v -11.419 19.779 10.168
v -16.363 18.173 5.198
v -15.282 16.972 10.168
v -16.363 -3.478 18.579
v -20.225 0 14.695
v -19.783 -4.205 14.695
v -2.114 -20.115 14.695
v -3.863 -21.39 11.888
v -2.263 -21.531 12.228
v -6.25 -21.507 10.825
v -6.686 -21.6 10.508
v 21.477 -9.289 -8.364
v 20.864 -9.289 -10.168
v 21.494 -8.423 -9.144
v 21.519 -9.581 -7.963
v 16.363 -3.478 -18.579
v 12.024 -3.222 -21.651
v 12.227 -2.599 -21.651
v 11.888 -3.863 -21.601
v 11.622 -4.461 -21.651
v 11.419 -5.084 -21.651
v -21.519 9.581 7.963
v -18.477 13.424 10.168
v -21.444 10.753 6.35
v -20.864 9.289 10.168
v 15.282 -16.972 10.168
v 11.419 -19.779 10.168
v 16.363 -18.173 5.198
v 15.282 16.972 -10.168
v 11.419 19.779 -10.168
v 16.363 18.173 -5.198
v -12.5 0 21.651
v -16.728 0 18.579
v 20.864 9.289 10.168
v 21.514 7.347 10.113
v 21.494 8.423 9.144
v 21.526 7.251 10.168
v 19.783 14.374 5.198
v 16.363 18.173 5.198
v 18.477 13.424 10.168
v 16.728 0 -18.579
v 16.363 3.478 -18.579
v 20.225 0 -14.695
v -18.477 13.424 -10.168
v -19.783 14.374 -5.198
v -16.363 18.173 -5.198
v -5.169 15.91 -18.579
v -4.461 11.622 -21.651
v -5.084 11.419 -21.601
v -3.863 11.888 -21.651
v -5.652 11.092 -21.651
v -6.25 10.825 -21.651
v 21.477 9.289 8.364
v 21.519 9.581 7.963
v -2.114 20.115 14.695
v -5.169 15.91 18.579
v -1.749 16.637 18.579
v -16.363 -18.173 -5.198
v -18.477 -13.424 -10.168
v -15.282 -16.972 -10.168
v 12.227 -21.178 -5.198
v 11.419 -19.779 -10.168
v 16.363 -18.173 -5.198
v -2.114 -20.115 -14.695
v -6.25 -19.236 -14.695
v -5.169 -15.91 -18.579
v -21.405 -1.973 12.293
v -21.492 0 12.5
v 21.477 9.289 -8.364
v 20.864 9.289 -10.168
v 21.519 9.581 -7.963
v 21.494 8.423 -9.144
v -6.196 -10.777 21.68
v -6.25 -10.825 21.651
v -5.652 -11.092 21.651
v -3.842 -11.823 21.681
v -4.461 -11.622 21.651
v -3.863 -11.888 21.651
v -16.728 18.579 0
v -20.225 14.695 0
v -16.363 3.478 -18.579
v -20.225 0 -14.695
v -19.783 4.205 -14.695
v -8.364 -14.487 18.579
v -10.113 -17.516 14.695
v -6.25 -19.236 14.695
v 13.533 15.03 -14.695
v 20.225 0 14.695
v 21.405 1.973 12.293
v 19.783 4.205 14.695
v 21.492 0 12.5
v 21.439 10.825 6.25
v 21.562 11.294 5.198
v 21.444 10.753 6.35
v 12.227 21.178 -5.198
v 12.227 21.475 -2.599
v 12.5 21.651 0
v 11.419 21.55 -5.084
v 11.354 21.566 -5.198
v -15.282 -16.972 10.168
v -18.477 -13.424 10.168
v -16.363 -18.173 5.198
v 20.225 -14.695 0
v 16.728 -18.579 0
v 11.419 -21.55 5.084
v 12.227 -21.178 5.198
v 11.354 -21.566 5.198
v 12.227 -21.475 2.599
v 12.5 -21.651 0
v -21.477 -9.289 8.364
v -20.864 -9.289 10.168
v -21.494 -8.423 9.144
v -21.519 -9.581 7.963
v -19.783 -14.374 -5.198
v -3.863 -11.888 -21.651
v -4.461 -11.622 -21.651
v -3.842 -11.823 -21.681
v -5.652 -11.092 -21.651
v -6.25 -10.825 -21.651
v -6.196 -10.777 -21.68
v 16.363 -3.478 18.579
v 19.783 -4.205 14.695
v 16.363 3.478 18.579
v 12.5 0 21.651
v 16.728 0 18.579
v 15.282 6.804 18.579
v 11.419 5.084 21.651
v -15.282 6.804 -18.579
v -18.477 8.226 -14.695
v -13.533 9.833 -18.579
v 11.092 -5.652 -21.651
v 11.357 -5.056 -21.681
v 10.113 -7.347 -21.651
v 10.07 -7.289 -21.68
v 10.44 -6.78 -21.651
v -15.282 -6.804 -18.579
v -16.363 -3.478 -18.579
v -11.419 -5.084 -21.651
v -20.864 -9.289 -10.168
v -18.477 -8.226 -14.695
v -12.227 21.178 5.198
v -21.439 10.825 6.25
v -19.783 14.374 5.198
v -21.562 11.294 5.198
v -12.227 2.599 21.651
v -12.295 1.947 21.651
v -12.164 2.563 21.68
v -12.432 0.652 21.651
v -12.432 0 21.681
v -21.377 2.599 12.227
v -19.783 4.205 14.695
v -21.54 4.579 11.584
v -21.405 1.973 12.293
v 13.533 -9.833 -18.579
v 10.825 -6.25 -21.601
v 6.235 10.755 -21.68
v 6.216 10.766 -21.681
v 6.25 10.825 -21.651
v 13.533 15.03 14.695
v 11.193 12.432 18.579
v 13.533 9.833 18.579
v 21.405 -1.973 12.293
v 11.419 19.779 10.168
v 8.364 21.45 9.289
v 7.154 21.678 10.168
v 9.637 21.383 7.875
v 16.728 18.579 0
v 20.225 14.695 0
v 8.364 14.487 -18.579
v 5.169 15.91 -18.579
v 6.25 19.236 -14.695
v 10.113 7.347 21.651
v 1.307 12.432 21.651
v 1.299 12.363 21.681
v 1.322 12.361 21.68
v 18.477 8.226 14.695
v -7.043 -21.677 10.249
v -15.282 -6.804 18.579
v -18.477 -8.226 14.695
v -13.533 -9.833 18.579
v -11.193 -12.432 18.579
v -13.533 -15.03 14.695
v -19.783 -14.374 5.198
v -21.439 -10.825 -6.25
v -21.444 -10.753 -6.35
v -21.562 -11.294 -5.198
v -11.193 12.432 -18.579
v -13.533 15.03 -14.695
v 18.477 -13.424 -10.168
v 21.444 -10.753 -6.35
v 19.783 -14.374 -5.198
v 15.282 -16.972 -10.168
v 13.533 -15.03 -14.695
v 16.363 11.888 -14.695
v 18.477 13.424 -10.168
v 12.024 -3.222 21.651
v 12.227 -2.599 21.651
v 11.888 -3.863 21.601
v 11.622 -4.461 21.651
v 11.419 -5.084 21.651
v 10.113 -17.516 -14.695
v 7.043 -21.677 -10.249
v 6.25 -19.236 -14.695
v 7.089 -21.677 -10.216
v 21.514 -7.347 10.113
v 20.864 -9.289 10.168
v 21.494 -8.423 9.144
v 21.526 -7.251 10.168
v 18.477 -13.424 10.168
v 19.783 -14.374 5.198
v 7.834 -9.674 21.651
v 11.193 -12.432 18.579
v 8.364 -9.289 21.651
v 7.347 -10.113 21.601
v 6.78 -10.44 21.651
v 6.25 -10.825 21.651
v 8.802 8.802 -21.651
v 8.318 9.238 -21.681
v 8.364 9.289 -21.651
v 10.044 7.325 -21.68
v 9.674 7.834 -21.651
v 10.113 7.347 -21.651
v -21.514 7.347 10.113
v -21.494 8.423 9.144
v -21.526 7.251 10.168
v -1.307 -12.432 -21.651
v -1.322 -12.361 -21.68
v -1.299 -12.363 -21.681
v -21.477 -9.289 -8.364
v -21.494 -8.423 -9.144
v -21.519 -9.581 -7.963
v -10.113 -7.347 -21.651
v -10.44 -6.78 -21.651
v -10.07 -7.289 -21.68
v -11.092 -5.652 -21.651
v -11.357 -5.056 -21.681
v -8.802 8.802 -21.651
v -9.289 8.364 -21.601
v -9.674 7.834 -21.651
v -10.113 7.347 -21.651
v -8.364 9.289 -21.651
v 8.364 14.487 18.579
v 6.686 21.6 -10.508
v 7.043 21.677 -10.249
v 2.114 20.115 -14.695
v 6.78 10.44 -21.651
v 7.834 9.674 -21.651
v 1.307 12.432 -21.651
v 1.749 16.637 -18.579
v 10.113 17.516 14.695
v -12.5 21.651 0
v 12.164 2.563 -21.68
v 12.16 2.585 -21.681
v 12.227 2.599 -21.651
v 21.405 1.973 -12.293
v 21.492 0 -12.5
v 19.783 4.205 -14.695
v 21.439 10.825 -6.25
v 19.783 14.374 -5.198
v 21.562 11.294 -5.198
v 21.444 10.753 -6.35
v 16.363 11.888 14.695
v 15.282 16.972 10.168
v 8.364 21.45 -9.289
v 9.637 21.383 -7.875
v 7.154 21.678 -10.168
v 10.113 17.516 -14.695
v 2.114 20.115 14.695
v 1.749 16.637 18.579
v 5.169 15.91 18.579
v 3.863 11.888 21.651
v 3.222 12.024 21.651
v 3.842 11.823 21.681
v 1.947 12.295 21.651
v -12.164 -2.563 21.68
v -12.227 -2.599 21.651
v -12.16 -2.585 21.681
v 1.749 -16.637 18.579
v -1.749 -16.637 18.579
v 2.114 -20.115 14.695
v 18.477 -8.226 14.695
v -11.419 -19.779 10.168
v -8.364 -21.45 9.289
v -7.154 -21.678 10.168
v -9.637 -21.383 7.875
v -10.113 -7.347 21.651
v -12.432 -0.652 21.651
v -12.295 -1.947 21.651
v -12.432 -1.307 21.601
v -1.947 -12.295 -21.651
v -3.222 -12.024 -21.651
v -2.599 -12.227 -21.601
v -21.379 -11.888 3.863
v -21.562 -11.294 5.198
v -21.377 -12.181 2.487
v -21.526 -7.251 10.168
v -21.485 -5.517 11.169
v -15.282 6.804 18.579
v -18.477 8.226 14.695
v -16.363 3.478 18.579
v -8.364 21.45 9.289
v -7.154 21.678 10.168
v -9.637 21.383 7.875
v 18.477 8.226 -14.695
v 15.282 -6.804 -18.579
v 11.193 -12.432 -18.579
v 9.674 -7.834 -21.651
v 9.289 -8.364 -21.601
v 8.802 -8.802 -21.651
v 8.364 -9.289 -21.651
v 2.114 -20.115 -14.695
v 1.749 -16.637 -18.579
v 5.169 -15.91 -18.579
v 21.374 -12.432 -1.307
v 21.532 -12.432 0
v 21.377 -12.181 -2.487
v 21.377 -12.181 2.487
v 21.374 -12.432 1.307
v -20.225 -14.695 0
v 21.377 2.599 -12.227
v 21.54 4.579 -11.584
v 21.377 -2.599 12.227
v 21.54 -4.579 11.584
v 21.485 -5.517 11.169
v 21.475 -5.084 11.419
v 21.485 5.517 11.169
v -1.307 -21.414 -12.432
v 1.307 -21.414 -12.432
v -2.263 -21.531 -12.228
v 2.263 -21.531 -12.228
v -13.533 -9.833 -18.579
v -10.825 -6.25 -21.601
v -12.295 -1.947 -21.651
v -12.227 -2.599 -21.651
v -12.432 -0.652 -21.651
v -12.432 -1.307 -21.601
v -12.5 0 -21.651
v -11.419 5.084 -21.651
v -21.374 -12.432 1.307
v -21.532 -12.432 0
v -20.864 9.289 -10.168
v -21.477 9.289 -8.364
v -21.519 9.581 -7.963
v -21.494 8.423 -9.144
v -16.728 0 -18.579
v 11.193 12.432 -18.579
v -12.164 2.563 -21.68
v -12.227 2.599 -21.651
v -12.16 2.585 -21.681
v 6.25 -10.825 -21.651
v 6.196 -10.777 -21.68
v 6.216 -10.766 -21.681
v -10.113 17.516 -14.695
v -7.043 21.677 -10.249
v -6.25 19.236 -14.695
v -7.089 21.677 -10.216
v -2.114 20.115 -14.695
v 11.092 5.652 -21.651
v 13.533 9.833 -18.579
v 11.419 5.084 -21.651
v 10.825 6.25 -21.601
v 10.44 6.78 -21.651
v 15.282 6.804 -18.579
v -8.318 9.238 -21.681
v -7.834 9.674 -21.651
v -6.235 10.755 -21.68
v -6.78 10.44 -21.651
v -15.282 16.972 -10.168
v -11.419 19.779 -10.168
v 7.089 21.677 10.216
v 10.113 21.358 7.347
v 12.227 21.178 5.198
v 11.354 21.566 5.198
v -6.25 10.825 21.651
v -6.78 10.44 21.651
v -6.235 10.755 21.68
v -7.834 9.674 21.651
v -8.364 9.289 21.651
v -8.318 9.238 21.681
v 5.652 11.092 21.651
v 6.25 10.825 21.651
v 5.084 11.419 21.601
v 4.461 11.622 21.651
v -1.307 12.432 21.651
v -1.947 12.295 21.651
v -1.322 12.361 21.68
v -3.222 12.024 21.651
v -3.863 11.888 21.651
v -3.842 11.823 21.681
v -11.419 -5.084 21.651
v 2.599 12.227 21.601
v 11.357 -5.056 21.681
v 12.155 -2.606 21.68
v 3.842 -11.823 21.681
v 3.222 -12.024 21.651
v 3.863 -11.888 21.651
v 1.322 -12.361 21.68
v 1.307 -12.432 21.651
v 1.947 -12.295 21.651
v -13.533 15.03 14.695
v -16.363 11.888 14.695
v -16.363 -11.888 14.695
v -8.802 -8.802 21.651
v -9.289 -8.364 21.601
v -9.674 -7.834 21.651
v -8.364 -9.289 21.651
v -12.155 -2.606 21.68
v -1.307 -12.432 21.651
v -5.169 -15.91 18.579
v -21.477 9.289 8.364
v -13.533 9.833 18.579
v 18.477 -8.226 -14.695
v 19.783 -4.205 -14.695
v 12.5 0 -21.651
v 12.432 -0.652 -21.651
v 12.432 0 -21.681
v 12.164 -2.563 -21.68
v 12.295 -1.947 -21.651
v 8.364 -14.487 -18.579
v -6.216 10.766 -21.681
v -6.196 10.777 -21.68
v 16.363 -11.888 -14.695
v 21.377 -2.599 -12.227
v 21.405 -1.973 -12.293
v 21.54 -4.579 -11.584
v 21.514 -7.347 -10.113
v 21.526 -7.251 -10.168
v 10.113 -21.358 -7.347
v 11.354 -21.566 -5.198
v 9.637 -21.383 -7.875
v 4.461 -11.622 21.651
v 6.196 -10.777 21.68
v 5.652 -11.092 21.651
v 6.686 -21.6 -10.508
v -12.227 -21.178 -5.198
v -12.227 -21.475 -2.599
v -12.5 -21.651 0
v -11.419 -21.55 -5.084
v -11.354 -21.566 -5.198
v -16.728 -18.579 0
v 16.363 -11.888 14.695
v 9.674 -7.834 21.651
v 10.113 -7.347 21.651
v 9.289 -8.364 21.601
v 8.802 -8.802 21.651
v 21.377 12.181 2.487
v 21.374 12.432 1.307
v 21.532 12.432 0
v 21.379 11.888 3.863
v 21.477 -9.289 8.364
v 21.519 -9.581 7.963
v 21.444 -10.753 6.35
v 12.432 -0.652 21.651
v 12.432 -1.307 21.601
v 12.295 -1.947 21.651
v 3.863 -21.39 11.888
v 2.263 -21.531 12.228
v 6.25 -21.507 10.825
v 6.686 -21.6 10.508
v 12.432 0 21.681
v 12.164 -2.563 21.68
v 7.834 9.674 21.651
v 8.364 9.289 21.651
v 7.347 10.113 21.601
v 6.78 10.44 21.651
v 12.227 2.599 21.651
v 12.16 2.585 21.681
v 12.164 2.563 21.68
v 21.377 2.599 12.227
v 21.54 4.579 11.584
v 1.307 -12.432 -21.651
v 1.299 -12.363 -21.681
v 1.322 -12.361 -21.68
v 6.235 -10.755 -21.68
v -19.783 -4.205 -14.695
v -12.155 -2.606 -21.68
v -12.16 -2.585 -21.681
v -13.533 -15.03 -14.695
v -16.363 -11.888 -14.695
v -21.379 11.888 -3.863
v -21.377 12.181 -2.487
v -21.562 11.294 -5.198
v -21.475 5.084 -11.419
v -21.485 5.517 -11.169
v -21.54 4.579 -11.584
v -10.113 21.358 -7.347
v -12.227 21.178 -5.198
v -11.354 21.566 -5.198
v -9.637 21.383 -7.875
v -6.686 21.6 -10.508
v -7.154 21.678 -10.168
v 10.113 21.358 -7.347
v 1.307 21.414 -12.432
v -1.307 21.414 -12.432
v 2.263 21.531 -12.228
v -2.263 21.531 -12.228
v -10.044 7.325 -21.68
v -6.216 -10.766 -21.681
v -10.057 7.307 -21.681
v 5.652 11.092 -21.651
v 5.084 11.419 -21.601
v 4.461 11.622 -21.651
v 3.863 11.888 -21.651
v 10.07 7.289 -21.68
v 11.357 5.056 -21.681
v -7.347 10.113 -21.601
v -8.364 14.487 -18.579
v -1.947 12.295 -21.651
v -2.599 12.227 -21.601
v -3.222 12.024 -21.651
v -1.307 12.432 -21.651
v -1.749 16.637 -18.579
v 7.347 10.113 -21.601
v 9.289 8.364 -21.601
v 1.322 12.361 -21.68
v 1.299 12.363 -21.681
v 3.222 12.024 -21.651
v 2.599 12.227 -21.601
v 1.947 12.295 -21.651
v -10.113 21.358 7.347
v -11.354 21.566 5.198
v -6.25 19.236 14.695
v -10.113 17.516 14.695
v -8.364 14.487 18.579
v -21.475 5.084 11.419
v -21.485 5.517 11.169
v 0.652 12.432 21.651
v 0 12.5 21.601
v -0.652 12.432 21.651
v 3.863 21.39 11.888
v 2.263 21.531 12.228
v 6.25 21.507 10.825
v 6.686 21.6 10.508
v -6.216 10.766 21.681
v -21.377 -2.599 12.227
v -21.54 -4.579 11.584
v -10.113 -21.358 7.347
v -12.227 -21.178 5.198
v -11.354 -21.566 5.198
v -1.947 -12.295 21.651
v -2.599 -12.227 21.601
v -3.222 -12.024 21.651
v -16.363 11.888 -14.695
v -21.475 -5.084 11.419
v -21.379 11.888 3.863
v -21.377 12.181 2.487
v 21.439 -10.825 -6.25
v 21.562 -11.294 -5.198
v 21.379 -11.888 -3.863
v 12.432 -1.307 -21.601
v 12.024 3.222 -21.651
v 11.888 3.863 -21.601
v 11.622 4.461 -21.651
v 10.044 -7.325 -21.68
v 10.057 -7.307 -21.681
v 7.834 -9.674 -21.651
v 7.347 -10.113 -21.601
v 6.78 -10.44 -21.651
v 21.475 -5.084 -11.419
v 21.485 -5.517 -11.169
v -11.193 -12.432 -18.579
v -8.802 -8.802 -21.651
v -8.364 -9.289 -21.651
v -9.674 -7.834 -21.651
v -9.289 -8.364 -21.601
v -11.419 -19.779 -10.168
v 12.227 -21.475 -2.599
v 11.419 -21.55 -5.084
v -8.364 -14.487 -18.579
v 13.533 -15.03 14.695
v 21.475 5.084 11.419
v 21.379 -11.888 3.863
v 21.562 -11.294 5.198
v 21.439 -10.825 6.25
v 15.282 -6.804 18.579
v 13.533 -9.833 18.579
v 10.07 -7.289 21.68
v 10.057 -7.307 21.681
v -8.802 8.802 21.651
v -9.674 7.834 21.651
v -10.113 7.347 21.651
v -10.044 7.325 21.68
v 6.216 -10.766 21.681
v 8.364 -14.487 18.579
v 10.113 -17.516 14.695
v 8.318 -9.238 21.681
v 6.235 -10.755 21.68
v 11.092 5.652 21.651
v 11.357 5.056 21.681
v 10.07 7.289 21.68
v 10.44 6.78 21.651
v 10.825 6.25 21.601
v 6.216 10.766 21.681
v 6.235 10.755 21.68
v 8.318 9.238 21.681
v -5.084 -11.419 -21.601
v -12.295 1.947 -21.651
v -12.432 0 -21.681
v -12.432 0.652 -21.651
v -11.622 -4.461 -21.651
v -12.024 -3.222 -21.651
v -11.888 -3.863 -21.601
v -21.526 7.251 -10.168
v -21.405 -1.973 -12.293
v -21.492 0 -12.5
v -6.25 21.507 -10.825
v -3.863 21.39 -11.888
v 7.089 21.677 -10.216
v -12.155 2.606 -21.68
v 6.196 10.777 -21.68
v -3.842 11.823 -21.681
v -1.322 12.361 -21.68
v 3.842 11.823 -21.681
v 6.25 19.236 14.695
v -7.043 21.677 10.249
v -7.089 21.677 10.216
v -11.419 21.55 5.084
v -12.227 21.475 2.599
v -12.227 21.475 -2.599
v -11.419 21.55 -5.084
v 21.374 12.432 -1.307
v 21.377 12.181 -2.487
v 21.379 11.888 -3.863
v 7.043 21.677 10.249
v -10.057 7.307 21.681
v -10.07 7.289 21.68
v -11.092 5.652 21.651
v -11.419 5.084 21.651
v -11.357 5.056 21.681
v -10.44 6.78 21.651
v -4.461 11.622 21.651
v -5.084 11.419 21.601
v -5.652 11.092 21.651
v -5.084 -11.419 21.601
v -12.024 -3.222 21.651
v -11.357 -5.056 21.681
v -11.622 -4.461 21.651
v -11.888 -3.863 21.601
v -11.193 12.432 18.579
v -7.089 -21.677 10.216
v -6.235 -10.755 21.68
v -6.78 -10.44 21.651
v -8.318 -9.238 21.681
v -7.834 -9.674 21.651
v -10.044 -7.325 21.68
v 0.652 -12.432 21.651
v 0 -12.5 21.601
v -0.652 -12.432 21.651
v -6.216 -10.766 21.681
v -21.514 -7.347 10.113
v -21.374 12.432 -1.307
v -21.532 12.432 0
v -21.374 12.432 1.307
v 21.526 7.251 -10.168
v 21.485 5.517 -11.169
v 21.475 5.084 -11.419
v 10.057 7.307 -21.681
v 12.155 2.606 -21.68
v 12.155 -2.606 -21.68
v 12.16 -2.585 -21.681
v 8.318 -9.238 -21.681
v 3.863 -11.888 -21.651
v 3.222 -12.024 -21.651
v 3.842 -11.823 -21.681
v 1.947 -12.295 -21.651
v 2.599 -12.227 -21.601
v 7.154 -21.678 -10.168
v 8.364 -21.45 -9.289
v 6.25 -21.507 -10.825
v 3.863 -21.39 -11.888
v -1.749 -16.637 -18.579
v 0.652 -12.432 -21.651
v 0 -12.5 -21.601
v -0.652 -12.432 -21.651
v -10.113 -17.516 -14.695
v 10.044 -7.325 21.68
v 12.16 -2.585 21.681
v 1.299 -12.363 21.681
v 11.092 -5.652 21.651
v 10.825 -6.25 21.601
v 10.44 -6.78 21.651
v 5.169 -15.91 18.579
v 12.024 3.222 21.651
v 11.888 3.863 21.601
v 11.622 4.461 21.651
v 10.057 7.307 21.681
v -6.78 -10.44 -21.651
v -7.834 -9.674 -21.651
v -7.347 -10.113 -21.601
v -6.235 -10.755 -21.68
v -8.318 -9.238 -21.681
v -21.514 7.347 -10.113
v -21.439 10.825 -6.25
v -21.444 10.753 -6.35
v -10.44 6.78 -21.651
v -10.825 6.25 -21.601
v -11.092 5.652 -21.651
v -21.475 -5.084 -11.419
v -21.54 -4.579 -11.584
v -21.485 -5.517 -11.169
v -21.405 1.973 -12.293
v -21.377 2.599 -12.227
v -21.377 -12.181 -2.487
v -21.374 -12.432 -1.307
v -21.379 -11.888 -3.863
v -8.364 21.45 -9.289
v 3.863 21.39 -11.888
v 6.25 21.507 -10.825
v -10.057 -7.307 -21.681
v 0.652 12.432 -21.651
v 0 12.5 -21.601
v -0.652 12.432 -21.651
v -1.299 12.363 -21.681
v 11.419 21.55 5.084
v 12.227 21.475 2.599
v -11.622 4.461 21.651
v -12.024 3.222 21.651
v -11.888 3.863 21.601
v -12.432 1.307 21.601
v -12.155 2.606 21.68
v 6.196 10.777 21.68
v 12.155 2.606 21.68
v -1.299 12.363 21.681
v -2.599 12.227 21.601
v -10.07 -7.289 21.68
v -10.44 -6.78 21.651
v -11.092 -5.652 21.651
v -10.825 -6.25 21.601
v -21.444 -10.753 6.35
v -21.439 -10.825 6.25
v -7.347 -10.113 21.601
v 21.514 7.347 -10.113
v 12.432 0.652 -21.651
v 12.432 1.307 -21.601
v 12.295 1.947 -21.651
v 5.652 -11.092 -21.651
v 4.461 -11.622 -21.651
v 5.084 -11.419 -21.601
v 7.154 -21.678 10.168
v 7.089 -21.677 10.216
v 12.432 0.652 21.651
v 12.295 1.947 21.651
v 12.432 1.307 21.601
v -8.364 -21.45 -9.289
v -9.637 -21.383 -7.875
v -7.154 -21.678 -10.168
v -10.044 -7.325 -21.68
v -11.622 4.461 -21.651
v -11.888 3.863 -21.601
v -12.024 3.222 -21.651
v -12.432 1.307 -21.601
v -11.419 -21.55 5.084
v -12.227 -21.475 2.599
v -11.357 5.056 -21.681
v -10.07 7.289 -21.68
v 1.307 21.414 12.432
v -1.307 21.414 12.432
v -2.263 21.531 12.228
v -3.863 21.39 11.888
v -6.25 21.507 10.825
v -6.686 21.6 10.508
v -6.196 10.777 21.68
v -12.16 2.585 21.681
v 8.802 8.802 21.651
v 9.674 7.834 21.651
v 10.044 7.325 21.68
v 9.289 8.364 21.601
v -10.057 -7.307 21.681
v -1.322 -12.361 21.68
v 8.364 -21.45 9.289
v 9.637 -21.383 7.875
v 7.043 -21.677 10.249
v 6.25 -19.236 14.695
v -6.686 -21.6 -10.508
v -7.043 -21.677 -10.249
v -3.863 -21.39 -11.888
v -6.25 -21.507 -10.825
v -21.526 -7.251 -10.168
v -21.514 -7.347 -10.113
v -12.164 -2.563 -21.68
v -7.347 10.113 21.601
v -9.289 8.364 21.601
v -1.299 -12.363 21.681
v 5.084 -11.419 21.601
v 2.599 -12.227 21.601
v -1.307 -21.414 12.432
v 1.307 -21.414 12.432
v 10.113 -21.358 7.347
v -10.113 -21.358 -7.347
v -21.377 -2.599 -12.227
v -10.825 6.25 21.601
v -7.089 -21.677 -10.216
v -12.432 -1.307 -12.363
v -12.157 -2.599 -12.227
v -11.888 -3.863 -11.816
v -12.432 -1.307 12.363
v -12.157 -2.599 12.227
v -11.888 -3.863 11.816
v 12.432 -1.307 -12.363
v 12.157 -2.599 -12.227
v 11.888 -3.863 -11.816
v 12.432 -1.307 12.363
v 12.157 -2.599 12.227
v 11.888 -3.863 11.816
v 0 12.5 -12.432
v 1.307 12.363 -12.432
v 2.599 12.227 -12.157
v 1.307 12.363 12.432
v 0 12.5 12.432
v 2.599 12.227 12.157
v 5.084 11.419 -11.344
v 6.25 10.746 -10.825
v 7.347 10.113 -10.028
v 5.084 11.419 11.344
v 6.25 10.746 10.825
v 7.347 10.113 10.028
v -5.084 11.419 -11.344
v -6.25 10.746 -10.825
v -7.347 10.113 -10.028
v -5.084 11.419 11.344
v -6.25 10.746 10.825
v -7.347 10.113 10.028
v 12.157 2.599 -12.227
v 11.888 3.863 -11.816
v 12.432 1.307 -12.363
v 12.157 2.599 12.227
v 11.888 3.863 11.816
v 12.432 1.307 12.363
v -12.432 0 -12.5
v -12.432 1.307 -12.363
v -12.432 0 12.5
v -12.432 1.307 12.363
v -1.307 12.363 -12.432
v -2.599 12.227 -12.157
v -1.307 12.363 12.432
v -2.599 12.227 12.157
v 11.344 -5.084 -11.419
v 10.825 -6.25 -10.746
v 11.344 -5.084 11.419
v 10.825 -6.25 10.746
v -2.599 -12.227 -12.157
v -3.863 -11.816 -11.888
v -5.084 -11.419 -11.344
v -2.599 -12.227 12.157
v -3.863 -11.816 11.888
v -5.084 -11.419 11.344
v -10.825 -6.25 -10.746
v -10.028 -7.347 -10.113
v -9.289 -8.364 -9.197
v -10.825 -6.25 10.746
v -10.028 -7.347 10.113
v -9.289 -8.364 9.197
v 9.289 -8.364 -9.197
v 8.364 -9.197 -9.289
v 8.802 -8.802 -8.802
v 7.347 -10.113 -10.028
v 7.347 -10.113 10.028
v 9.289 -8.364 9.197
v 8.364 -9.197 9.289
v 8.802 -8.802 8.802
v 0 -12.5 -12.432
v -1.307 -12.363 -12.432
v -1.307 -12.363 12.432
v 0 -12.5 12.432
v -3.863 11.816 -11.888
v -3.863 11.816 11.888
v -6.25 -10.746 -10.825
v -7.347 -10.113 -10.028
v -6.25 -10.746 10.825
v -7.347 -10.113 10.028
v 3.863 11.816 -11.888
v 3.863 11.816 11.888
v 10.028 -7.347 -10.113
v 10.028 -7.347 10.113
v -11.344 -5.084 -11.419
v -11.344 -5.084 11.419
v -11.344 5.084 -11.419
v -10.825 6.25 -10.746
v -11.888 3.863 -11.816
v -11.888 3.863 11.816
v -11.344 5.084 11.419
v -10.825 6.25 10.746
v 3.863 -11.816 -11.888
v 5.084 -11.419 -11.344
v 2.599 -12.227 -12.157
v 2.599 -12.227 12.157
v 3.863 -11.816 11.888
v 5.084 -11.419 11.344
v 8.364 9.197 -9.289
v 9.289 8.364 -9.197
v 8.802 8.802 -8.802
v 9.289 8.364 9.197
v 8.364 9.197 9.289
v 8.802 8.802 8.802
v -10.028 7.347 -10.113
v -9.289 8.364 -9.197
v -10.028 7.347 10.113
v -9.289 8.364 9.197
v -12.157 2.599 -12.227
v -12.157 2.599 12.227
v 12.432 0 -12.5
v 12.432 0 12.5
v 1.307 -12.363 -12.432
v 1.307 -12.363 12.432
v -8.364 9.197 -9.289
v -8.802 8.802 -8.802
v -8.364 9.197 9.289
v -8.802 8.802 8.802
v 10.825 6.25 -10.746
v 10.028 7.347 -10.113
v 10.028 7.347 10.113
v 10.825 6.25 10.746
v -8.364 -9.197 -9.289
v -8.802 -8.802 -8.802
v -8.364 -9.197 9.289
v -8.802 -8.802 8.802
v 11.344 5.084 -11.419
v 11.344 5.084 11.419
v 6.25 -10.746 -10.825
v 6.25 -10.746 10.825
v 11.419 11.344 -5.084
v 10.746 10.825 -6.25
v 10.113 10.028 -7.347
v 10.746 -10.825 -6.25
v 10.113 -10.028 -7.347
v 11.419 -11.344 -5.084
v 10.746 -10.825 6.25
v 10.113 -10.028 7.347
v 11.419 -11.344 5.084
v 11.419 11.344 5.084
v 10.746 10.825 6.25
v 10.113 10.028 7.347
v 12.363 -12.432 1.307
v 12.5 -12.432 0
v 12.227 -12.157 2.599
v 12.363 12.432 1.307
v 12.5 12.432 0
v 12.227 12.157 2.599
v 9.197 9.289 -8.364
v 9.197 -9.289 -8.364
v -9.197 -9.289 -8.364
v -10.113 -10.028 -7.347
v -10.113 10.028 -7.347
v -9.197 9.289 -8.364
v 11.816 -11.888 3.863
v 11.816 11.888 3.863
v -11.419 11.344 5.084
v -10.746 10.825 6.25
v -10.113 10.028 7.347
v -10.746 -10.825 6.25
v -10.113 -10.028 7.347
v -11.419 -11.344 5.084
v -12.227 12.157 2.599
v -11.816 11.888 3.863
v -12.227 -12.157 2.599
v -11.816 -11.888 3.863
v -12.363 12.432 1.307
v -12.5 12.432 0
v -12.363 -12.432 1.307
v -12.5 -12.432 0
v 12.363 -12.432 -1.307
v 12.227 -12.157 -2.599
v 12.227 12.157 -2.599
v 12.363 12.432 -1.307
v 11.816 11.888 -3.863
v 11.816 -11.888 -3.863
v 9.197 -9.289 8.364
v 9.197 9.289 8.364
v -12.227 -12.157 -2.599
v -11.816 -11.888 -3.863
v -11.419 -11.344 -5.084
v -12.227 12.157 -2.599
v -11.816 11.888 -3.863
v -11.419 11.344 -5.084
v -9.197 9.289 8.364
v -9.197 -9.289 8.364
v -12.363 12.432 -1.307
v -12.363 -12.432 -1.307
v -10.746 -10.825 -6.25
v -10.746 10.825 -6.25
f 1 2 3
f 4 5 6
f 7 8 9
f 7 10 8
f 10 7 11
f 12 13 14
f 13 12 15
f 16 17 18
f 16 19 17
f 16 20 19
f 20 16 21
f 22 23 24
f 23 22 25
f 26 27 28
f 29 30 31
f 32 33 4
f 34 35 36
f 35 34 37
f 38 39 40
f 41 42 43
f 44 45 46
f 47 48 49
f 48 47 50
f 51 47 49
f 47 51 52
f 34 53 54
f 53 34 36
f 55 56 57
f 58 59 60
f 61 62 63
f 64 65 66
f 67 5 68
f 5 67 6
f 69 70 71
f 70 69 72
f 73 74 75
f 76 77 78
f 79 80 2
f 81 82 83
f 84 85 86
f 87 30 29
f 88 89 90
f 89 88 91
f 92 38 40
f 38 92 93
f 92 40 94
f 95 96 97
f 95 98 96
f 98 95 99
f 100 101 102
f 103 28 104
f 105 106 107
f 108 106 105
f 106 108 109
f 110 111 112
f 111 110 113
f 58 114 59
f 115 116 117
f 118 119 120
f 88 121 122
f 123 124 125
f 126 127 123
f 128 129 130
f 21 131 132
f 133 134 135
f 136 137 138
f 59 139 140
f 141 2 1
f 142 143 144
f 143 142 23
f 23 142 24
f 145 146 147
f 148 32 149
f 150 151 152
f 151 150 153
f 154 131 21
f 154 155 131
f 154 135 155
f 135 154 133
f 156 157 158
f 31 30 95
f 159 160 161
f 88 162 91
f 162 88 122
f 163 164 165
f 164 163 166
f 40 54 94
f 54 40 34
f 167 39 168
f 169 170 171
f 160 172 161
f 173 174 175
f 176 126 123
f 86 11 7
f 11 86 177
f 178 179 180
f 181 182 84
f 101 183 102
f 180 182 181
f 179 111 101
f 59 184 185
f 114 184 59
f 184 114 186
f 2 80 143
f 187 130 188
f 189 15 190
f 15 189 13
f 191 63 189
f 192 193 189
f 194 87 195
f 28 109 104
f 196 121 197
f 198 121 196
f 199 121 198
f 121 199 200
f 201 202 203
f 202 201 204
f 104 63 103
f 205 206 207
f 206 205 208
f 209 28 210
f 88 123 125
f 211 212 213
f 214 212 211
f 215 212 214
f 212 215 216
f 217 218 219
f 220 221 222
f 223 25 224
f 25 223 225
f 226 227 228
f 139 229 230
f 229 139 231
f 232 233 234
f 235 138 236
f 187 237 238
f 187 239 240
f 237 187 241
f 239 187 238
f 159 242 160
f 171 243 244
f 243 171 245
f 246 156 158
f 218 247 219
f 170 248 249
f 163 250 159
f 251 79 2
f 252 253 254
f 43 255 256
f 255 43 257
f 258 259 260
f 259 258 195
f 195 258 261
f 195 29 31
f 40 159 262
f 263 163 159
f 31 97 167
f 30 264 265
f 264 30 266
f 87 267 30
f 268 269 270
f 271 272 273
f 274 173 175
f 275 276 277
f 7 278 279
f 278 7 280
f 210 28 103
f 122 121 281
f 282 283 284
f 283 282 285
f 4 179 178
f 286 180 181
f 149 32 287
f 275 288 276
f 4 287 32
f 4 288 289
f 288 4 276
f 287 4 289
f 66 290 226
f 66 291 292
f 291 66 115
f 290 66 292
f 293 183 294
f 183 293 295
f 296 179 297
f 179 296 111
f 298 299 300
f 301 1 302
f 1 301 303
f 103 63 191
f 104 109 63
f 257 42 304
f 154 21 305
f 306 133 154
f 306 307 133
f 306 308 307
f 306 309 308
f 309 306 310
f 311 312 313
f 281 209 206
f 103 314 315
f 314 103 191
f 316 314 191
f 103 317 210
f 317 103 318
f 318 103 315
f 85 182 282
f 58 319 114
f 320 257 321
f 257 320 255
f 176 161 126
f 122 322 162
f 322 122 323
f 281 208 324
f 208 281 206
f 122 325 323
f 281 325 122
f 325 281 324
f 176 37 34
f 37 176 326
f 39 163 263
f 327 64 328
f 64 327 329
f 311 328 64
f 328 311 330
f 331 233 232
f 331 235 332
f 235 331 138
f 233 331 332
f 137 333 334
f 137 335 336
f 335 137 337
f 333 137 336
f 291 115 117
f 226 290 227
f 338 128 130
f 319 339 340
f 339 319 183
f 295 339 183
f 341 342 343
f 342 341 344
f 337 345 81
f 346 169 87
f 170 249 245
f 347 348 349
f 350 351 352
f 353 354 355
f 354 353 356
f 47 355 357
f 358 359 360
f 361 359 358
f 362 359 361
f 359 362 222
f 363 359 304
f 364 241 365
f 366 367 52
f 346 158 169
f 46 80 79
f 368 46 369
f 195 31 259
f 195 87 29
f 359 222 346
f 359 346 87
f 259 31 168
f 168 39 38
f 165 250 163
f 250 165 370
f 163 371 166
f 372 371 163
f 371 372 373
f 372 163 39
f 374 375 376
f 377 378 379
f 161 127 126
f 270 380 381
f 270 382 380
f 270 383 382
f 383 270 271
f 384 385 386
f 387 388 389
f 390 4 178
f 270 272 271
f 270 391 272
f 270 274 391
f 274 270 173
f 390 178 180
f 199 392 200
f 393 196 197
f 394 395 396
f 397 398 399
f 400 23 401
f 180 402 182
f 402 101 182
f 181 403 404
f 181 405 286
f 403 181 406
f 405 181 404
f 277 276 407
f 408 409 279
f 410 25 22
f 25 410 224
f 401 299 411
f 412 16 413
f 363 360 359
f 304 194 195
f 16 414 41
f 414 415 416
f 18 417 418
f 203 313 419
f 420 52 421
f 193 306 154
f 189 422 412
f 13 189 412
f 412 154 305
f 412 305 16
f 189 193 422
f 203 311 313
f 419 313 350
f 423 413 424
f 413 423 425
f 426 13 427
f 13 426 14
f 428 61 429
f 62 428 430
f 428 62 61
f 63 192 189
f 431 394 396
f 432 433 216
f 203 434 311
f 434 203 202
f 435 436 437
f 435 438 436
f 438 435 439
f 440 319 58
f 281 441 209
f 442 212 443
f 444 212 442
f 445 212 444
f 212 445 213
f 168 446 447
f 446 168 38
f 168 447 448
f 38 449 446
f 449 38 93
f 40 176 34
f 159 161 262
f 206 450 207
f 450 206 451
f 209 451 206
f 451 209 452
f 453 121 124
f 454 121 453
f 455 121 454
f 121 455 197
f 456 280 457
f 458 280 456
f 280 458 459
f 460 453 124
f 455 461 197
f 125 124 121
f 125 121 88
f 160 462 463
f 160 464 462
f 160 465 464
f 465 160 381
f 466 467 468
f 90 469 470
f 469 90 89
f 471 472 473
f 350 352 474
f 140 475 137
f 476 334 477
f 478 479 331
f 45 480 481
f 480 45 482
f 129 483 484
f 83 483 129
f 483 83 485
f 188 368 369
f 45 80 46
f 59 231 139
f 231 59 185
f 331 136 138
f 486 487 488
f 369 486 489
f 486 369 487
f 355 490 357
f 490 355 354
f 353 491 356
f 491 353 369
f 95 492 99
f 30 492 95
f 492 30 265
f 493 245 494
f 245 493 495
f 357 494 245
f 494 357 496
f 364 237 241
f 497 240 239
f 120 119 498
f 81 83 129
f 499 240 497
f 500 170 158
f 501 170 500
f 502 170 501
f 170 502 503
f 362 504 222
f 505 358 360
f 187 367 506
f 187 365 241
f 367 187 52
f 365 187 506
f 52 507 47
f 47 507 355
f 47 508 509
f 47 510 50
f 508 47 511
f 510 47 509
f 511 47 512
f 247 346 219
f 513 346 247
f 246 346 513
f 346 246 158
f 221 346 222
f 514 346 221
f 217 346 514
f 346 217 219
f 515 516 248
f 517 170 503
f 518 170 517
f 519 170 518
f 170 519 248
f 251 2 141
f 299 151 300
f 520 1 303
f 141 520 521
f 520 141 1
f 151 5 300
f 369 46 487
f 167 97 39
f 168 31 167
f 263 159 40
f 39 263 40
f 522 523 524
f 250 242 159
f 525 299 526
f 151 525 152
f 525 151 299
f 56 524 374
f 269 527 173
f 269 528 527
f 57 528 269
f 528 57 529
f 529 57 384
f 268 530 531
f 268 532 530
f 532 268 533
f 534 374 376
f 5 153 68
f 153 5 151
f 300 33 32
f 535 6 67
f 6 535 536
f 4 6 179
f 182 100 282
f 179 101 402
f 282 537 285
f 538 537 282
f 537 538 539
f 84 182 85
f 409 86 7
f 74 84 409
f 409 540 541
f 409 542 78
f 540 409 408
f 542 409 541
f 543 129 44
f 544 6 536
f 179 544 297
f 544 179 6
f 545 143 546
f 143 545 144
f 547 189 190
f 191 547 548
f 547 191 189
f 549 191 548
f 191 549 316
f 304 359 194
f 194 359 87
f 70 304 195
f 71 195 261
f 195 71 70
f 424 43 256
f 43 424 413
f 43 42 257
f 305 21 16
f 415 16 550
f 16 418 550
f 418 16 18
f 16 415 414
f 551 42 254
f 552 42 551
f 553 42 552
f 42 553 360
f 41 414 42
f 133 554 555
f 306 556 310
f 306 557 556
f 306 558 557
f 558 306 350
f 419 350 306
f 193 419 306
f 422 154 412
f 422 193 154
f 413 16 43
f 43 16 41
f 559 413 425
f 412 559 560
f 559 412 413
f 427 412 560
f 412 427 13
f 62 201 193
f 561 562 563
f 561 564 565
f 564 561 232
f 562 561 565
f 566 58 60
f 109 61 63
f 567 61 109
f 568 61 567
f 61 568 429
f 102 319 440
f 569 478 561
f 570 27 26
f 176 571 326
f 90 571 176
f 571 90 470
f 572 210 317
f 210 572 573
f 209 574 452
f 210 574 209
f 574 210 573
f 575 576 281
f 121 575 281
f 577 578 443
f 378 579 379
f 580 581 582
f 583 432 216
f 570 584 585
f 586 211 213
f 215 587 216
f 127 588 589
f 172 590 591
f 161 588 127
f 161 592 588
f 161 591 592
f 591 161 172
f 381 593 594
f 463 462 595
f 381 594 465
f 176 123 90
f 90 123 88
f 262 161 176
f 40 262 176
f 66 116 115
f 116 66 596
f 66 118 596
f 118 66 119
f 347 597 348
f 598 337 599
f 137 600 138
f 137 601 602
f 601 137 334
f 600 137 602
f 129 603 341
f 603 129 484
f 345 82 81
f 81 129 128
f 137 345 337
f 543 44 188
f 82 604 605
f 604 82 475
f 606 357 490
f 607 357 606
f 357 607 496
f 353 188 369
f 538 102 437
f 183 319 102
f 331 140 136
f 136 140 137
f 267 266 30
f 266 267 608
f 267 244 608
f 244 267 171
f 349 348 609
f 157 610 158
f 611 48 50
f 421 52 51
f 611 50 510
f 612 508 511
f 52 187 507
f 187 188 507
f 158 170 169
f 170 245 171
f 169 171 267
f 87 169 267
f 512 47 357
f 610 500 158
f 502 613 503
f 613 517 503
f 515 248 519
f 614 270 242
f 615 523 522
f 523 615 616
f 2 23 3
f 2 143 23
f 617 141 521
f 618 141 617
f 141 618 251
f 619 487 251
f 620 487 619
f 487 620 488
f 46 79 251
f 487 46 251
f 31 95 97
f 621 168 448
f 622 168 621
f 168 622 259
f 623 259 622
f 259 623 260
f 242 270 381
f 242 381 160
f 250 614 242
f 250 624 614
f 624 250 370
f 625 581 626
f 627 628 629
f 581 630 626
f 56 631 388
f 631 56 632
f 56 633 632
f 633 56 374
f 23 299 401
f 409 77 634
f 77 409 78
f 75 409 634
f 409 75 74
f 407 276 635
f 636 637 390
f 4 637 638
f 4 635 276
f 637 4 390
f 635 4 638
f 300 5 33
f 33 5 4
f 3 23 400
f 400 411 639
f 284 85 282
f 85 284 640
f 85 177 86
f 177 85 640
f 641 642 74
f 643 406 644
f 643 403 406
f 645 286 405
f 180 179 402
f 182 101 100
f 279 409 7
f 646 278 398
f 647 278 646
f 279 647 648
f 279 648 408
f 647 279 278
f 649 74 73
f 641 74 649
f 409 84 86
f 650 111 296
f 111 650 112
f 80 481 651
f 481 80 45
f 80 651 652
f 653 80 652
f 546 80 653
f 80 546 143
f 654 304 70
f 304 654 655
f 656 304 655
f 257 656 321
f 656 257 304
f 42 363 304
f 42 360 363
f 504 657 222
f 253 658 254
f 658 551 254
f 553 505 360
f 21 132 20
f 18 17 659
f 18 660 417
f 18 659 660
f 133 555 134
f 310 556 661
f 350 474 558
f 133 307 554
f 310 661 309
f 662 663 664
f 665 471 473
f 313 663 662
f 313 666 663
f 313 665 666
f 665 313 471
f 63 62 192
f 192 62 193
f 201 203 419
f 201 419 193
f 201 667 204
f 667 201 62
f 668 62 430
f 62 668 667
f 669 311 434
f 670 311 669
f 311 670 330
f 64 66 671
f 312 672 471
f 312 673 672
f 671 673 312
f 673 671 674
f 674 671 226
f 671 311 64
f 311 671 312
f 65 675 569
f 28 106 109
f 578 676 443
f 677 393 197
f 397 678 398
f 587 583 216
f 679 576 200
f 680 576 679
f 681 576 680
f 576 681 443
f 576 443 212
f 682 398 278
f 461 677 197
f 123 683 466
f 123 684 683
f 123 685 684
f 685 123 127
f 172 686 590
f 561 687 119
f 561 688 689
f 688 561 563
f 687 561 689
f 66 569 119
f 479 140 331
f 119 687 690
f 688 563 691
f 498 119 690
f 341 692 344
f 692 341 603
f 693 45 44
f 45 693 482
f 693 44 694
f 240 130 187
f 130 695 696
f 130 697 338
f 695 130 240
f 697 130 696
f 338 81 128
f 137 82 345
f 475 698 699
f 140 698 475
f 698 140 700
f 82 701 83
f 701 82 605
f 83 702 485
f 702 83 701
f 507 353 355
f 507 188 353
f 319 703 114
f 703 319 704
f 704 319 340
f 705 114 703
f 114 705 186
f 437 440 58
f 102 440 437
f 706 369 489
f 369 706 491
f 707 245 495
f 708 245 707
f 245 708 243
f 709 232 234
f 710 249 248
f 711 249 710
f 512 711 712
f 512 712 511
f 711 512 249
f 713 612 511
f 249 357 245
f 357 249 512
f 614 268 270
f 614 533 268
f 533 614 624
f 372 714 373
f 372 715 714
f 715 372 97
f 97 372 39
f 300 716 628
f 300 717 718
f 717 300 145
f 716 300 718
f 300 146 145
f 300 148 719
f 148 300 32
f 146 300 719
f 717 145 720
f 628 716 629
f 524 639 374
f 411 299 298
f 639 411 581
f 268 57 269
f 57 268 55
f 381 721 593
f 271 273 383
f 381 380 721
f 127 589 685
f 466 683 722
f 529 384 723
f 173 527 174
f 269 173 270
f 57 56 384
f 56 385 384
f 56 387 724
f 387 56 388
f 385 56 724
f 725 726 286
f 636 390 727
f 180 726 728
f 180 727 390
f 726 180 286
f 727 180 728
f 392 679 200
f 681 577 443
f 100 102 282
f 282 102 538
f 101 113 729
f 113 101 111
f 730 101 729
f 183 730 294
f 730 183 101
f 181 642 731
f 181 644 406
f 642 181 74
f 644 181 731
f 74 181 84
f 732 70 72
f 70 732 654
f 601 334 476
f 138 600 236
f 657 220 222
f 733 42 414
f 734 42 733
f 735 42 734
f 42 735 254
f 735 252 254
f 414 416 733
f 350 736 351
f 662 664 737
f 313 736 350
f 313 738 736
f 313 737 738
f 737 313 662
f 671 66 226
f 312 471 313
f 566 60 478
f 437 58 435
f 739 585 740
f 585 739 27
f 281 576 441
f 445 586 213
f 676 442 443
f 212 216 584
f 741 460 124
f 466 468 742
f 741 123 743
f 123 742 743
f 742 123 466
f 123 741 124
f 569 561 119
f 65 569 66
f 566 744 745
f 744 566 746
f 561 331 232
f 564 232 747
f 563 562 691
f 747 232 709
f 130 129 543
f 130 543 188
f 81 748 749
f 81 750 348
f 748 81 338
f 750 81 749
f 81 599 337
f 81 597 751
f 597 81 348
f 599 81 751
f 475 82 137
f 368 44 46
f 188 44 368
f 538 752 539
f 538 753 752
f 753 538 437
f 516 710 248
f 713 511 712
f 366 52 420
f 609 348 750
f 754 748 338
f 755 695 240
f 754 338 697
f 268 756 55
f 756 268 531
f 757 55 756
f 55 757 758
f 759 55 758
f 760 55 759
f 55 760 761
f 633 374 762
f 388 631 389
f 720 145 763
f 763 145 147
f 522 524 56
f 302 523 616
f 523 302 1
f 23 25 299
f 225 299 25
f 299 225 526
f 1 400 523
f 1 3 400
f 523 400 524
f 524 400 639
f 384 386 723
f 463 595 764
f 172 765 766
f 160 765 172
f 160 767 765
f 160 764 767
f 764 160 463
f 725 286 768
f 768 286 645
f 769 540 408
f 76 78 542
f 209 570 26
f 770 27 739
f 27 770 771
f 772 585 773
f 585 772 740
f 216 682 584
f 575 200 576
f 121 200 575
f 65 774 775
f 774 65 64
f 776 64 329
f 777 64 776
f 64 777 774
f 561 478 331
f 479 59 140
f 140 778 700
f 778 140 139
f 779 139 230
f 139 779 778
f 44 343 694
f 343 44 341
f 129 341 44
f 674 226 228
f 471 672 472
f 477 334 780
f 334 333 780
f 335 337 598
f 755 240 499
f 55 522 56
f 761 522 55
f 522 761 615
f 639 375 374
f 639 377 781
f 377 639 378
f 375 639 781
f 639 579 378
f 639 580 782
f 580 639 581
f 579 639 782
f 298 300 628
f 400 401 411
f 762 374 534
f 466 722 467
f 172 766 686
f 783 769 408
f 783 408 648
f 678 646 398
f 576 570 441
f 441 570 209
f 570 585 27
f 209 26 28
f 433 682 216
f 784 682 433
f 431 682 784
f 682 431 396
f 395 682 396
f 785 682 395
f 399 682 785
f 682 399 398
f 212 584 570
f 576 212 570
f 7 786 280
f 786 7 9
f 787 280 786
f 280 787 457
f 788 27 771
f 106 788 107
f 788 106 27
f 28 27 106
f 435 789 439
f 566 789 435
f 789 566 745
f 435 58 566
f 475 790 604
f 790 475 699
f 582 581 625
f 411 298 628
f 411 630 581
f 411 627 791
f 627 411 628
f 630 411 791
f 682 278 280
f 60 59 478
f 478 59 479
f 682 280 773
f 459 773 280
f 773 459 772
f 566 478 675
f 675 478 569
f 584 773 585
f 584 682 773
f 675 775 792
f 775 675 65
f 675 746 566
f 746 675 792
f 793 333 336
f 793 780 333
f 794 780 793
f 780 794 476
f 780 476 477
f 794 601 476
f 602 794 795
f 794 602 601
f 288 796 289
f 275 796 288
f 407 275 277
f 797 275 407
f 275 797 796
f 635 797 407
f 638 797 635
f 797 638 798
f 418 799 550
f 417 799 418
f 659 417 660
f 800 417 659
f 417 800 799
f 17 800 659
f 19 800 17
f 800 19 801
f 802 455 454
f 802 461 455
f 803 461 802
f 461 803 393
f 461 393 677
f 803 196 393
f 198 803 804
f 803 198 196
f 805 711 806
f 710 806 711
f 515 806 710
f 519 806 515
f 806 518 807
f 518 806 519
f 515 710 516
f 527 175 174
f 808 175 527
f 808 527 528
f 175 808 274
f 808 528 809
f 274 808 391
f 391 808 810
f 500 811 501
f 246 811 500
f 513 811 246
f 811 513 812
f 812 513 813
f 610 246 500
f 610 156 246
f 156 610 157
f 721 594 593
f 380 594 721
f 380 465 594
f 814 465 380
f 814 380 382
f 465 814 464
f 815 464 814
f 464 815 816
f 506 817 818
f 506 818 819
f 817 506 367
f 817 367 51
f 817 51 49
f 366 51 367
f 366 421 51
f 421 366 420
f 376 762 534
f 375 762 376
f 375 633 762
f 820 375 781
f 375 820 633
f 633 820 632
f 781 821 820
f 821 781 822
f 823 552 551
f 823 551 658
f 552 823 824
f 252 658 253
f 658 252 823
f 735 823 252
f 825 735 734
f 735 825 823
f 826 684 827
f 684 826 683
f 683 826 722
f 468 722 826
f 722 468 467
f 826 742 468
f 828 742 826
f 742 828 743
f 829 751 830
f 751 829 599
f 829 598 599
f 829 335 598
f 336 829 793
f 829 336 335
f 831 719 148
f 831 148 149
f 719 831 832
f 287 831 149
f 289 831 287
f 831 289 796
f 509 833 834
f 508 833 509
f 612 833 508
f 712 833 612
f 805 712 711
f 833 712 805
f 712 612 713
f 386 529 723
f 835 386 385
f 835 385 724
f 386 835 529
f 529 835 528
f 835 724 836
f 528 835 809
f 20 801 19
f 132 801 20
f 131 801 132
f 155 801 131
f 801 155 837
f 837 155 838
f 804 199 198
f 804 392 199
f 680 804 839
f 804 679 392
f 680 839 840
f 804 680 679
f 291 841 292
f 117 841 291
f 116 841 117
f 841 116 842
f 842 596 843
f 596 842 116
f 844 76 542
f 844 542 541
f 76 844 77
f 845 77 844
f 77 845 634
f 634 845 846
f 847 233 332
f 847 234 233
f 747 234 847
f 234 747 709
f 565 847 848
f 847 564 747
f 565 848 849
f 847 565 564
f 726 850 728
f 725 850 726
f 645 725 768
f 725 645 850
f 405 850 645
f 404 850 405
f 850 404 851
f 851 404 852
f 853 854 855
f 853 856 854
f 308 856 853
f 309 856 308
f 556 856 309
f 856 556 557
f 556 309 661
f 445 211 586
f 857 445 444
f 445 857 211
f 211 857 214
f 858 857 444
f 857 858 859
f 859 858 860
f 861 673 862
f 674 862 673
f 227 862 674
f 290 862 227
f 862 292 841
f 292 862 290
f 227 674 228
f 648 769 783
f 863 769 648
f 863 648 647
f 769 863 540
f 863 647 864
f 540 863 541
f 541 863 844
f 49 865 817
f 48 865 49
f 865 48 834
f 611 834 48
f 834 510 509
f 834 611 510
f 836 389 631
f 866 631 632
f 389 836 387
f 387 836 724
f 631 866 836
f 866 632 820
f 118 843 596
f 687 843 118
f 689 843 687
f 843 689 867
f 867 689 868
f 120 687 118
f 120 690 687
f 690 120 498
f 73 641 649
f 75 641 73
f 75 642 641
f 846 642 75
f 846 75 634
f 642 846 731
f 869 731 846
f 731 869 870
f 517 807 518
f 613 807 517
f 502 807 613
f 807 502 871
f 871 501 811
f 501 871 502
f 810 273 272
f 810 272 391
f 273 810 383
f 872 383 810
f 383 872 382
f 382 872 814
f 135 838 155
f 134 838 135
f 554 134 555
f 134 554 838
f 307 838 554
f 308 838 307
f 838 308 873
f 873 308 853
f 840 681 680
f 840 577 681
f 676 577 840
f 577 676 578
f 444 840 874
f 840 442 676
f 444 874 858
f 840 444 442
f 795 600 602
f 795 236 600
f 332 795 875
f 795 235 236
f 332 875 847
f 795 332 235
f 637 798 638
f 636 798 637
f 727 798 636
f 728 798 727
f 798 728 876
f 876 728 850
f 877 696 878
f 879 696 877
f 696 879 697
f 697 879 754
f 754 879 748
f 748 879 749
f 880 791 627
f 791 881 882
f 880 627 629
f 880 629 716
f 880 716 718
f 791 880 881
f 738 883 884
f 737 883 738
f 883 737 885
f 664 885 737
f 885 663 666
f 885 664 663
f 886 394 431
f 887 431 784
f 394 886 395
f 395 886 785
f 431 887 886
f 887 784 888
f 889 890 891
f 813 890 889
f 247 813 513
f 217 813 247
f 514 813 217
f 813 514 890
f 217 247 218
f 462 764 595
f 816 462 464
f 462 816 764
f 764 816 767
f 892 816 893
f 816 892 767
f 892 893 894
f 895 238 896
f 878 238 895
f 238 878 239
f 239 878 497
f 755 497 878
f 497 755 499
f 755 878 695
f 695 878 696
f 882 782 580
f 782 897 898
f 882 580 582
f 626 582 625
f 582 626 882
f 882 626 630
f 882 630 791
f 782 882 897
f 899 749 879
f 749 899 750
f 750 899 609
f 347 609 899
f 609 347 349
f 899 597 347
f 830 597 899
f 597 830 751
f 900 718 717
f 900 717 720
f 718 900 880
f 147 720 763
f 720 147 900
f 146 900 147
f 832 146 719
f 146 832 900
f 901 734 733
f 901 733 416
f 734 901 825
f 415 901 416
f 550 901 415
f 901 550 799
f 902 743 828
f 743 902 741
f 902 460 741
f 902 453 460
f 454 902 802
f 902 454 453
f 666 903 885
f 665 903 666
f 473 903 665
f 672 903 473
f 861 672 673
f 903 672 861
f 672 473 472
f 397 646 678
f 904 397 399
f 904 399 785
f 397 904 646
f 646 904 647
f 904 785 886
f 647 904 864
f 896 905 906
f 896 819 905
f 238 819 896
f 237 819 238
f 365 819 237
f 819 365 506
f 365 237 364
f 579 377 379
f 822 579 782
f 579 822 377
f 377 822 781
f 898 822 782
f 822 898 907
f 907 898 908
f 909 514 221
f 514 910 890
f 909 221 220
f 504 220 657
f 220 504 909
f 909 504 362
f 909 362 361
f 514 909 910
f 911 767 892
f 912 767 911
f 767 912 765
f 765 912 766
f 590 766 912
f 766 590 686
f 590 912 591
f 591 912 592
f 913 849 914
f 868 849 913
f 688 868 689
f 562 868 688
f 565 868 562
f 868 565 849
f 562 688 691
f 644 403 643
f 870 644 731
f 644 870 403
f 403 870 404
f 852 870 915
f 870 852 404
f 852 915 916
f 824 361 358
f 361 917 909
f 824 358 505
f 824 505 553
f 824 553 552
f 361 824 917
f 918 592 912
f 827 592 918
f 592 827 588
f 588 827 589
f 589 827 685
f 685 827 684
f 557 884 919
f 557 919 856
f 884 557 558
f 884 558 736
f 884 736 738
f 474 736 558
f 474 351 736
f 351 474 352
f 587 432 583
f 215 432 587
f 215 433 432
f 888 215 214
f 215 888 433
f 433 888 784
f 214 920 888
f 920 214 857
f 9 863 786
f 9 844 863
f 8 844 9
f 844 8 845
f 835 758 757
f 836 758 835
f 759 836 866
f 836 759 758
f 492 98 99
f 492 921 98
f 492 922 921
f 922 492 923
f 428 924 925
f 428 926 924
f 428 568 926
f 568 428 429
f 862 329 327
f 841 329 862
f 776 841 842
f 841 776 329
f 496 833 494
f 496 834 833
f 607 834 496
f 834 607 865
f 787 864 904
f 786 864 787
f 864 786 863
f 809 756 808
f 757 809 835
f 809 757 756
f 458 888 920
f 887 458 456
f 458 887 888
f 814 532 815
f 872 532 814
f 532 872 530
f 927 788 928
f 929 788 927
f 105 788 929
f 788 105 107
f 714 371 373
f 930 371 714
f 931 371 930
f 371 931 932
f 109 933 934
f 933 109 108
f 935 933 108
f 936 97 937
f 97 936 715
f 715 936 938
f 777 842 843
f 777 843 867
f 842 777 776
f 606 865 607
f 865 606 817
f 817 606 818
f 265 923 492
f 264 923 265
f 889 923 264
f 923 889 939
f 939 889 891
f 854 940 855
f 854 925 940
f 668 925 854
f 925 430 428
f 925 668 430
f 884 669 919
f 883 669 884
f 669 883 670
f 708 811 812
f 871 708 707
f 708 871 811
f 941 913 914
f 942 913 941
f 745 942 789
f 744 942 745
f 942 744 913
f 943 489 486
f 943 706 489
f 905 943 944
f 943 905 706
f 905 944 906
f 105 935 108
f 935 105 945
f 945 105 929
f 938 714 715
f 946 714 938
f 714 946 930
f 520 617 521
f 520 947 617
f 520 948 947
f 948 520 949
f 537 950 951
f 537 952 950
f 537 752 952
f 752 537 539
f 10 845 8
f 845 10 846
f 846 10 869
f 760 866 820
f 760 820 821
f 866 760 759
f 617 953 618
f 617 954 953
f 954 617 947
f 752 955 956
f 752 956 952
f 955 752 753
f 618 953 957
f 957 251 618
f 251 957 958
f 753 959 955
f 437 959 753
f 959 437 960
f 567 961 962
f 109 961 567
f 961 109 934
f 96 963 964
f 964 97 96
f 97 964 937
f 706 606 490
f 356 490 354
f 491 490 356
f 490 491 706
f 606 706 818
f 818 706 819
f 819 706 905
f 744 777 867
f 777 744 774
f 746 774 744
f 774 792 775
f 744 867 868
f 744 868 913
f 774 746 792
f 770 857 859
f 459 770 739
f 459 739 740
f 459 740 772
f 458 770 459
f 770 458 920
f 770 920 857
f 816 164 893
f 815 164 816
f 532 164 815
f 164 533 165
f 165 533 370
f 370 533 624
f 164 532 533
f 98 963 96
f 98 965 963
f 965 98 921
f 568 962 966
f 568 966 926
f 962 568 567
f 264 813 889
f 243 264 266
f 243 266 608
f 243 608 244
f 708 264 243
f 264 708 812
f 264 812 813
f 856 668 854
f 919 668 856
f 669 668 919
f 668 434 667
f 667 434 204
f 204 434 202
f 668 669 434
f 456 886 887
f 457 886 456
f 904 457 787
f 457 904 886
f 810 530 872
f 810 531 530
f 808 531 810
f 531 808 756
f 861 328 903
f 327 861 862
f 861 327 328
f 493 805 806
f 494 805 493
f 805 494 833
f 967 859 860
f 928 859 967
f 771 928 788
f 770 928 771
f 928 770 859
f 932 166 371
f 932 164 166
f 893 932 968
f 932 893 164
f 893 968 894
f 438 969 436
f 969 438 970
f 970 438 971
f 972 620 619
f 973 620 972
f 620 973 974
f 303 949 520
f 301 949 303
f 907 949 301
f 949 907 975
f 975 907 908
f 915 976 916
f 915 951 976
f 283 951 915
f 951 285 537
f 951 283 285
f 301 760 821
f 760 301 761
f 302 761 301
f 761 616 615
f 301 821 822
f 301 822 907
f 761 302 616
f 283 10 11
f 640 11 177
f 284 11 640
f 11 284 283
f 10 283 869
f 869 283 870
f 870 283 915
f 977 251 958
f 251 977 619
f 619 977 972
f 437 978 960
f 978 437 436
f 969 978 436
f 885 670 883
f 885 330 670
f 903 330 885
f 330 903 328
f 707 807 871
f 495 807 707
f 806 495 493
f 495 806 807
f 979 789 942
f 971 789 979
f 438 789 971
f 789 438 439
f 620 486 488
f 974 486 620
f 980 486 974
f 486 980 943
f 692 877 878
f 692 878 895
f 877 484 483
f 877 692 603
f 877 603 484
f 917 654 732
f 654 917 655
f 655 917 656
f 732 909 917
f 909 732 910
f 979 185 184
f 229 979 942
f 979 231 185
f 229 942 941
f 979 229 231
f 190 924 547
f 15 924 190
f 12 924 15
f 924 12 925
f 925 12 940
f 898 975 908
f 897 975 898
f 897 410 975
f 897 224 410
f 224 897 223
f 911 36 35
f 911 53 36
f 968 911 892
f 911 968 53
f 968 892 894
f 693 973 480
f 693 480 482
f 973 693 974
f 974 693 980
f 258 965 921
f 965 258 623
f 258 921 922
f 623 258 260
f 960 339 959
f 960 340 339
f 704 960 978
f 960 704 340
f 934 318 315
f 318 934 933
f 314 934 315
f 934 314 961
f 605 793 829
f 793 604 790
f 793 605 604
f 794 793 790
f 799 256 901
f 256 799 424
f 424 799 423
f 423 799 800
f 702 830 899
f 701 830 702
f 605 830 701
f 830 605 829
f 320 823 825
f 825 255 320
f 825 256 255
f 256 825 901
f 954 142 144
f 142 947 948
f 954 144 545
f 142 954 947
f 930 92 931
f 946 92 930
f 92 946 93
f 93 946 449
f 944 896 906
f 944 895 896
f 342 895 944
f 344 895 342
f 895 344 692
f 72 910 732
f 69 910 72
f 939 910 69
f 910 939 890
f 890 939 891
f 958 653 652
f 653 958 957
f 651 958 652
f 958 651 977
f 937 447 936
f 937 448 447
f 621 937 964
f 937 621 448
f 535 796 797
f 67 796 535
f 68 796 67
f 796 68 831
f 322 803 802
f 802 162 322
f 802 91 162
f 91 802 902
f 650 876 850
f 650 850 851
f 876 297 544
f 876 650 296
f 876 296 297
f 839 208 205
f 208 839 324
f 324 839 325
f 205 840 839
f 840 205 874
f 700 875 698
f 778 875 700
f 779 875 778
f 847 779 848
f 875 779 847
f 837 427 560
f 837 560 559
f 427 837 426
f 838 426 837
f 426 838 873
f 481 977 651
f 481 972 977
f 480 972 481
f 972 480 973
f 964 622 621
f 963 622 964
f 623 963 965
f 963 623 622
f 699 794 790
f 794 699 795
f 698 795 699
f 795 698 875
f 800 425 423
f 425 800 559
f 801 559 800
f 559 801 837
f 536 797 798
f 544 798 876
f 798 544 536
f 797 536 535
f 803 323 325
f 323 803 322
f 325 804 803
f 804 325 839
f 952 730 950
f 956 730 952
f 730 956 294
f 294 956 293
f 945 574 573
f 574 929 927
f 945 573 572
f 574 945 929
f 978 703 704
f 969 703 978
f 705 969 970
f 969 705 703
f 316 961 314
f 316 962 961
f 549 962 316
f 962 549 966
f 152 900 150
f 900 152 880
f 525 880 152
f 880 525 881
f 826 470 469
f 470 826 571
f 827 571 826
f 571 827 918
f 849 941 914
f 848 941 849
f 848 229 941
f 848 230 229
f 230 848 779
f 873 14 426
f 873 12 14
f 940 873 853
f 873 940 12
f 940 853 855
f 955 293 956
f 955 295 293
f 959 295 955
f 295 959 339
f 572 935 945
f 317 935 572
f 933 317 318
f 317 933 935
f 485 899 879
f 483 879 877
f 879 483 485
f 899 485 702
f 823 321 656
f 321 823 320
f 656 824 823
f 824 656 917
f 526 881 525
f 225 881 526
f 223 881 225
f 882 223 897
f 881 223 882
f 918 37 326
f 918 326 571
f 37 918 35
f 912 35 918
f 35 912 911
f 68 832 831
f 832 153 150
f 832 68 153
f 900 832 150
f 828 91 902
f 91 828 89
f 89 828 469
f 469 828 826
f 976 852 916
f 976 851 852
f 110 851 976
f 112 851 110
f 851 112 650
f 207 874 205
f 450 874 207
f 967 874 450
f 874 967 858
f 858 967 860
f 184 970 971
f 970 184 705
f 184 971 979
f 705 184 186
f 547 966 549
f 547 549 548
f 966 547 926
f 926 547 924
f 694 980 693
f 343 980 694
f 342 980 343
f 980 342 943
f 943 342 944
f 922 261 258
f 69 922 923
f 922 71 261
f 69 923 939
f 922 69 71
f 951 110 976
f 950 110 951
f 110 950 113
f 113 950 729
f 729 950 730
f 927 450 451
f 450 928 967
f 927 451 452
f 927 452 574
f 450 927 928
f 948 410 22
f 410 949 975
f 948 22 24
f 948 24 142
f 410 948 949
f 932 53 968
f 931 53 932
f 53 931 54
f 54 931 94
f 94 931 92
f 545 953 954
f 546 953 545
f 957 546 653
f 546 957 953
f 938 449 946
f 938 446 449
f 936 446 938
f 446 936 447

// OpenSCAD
module example001()
{
	function r_from_dia(d) = d / 2;

	module rotcy(rot, r, h) {
		rotate(90, rot)
			cylinder(r = r, h = h, center = true);
	}

	difference() {
		sphere(r = r_from_dia(size));
		rotcy([0, 0, 1], cy_r, cy_h);
		rotcy([1, 0, 0], cy_r, cy_h);
		rotcy([0, 1, 0], cy_r, cy_h);
	}

	size = 50;
	hole = 25;

	cy_r = r_from_dia(hole);
	cy_h = r_from_dia(size * 2.5);
}

example001();
